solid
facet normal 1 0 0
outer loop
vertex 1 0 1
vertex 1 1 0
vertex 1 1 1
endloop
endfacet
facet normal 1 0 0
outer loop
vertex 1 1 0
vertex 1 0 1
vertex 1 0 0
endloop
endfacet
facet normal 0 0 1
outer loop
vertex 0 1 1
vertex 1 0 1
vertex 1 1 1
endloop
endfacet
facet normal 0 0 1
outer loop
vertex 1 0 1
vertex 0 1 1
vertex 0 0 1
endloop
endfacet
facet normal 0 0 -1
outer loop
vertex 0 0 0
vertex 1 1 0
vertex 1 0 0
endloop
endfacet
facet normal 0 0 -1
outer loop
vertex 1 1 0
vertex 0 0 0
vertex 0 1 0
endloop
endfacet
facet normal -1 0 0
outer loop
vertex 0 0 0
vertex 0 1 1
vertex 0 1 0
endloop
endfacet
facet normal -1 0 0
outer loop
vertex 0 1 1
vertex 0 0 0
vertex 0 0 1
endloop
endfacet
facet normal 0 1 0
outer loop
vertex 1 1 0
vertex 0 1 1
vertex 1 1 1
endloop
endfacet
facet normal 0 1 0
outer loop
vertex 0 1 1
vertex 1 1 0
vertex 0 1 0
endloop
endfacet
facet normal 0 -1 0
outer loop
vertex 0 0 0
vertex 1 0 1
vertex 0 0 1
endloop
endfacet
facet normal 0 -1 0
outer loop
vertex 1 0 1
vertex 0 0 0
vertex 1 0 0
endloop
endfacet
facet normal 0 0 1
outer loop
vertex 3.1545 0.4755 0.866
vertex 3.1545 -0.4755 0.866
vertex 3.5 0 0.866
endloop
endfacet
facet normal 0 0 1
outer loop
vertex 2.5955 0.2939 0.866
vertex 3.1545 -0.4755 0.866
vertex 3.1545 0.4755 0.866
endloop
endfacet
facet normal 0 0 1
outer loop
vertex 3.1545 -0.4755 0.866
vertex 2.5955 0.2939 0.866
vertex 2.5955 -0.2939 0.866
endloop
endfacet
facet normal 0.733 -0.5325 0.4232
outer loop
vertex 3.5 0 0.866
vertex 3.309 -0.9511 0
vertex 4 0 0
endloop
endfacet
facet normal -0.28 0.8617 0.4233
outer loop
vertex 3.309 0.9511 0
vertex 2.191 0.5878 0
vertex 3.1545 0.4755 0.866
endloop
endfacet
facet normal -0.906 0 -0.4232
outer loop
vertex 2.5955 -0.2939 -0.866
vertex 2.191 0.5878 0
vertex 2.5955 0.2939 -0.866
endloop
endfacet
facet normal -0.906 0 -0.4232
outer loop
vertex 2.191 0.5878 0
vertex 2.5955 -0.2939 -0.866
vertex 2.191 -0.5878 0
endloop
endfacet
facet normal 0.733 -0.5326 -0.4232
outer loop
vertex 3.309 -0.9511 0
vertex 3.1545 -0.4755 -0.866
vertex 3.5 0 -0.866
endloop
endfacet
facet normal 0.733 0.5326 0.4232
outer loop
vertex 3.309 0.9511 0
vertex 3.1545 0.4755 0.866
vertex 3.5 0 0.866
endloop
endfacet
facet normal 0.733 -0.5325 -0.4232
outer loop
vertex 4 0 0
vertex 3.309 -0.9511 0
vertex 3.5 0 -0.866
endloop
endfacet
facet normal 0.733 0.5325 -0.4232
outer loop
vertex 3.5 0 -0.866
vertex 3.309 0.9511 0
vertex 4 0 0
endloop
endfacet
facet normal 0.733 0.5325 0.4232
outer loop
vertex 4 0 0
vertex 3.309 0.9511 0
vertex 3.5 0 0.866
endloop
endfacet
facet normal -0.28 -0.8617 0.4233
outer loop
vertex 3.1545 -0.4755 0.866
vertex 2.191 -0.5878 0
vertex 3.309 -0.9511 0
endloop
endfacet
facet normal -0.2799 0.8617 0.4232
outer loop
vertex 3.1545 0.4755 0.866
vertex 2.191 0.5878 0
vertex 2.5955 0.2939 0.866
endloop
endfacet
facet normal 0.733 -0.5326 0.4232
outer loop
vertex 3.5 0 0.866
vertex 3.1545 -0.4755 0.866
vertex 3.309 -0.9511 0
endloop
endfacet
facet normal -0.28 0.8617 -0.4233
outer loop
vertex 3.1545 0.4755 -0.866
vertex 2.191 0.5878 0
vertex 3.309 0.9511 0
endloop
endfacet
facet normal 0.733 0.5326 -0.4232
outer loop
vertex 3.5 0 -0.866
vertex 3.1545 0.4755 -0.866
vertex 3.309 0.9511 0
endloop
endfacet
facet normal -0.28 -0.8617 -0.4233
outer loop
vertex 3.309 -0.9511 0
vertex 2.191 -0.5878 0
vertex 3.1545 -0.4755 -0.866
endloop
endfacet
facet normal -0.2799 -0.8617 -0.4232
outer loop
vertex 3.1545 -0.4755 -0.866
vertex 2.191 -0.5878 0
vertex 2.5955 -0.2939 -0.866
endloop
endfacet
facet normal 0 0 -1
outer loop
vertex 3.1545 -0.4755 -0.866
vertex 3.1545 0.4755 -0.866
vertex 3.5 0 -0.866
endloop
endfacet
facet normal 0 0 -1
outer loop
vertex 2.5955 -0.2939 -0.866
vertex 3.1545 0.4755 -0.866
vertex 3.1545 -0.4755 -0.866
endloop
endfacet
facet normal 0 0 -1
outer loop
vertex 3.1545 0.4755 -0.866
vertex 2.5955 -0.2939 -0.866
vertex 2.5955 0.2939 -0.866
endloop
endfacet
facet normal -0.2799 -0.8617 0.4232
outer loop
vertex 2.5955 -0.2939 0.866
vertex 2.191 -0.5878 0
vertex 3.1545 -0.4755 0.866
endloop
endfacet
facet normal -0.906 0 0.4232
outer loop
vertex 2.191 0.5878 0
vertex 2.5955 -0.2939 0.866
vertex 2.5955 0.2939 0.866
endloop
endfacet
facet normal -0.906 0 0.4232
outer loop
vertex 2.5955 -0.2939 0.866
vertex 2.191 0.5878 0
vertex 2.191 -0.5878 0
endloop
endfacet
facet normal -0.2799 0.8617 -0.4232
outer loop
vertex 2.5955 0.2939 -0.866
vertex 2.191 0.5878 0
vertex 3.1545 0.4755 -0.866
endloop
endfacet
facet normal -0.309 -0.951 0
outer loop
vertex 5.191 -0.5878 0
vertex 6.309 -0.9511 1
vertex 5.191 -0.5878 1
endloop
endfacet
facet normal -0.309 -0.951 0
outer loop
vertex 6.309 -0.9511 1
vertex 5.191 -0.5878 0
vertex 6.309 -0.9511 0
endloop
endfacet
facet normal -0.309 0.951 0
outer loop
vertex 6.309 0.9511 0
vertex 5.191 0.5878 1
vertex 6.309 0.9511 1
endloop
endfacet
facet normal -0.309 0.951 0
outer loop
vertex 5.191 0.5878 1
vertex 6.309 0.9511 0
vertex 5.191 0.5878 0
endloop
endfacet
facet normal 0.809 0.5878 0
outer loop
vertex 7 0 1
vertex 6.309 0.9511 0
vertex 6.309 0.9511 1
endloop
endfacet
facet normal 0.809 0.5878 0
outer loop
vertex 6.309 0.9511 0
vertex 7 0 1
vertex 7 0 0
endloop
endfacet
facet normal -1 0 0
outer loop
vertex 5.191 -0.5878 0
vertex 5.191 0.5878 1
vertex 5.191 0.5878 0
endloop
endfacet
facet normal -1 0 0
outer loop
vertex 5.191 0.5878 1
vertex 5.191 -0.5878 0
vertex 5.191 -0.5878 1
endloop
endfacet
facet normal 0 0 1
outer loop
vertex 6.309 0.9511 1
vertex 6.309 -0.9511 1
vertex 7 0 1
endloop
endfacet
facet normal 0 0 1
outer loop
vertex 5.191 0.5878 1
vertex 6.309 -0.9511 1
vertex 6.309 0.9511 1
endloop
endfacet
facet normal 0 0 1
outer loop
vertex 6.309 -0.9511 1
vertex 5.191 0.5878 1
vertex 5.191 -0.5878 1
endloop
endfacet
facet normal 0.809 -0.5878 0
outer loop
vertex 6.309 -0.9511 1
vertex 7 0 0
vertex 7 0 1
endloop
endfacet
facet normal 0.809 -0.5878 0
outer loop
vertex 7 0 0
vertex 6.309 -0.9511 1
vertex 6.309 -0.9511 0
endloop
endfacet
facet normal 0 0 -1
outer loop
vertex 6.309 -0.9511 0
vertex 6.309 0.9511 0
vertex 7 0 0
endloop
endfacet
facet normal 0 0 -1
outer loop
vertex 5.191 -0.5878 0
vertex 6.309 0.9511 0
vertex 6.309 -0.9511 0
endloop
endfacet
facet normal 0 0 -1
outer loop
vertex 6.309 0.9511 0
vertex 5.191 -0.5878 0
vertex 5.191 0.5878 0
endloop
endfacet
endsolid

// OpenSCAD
cube();
translate([3,0,0])
  sphere();
translate([6,0,0])
  cylinder();
